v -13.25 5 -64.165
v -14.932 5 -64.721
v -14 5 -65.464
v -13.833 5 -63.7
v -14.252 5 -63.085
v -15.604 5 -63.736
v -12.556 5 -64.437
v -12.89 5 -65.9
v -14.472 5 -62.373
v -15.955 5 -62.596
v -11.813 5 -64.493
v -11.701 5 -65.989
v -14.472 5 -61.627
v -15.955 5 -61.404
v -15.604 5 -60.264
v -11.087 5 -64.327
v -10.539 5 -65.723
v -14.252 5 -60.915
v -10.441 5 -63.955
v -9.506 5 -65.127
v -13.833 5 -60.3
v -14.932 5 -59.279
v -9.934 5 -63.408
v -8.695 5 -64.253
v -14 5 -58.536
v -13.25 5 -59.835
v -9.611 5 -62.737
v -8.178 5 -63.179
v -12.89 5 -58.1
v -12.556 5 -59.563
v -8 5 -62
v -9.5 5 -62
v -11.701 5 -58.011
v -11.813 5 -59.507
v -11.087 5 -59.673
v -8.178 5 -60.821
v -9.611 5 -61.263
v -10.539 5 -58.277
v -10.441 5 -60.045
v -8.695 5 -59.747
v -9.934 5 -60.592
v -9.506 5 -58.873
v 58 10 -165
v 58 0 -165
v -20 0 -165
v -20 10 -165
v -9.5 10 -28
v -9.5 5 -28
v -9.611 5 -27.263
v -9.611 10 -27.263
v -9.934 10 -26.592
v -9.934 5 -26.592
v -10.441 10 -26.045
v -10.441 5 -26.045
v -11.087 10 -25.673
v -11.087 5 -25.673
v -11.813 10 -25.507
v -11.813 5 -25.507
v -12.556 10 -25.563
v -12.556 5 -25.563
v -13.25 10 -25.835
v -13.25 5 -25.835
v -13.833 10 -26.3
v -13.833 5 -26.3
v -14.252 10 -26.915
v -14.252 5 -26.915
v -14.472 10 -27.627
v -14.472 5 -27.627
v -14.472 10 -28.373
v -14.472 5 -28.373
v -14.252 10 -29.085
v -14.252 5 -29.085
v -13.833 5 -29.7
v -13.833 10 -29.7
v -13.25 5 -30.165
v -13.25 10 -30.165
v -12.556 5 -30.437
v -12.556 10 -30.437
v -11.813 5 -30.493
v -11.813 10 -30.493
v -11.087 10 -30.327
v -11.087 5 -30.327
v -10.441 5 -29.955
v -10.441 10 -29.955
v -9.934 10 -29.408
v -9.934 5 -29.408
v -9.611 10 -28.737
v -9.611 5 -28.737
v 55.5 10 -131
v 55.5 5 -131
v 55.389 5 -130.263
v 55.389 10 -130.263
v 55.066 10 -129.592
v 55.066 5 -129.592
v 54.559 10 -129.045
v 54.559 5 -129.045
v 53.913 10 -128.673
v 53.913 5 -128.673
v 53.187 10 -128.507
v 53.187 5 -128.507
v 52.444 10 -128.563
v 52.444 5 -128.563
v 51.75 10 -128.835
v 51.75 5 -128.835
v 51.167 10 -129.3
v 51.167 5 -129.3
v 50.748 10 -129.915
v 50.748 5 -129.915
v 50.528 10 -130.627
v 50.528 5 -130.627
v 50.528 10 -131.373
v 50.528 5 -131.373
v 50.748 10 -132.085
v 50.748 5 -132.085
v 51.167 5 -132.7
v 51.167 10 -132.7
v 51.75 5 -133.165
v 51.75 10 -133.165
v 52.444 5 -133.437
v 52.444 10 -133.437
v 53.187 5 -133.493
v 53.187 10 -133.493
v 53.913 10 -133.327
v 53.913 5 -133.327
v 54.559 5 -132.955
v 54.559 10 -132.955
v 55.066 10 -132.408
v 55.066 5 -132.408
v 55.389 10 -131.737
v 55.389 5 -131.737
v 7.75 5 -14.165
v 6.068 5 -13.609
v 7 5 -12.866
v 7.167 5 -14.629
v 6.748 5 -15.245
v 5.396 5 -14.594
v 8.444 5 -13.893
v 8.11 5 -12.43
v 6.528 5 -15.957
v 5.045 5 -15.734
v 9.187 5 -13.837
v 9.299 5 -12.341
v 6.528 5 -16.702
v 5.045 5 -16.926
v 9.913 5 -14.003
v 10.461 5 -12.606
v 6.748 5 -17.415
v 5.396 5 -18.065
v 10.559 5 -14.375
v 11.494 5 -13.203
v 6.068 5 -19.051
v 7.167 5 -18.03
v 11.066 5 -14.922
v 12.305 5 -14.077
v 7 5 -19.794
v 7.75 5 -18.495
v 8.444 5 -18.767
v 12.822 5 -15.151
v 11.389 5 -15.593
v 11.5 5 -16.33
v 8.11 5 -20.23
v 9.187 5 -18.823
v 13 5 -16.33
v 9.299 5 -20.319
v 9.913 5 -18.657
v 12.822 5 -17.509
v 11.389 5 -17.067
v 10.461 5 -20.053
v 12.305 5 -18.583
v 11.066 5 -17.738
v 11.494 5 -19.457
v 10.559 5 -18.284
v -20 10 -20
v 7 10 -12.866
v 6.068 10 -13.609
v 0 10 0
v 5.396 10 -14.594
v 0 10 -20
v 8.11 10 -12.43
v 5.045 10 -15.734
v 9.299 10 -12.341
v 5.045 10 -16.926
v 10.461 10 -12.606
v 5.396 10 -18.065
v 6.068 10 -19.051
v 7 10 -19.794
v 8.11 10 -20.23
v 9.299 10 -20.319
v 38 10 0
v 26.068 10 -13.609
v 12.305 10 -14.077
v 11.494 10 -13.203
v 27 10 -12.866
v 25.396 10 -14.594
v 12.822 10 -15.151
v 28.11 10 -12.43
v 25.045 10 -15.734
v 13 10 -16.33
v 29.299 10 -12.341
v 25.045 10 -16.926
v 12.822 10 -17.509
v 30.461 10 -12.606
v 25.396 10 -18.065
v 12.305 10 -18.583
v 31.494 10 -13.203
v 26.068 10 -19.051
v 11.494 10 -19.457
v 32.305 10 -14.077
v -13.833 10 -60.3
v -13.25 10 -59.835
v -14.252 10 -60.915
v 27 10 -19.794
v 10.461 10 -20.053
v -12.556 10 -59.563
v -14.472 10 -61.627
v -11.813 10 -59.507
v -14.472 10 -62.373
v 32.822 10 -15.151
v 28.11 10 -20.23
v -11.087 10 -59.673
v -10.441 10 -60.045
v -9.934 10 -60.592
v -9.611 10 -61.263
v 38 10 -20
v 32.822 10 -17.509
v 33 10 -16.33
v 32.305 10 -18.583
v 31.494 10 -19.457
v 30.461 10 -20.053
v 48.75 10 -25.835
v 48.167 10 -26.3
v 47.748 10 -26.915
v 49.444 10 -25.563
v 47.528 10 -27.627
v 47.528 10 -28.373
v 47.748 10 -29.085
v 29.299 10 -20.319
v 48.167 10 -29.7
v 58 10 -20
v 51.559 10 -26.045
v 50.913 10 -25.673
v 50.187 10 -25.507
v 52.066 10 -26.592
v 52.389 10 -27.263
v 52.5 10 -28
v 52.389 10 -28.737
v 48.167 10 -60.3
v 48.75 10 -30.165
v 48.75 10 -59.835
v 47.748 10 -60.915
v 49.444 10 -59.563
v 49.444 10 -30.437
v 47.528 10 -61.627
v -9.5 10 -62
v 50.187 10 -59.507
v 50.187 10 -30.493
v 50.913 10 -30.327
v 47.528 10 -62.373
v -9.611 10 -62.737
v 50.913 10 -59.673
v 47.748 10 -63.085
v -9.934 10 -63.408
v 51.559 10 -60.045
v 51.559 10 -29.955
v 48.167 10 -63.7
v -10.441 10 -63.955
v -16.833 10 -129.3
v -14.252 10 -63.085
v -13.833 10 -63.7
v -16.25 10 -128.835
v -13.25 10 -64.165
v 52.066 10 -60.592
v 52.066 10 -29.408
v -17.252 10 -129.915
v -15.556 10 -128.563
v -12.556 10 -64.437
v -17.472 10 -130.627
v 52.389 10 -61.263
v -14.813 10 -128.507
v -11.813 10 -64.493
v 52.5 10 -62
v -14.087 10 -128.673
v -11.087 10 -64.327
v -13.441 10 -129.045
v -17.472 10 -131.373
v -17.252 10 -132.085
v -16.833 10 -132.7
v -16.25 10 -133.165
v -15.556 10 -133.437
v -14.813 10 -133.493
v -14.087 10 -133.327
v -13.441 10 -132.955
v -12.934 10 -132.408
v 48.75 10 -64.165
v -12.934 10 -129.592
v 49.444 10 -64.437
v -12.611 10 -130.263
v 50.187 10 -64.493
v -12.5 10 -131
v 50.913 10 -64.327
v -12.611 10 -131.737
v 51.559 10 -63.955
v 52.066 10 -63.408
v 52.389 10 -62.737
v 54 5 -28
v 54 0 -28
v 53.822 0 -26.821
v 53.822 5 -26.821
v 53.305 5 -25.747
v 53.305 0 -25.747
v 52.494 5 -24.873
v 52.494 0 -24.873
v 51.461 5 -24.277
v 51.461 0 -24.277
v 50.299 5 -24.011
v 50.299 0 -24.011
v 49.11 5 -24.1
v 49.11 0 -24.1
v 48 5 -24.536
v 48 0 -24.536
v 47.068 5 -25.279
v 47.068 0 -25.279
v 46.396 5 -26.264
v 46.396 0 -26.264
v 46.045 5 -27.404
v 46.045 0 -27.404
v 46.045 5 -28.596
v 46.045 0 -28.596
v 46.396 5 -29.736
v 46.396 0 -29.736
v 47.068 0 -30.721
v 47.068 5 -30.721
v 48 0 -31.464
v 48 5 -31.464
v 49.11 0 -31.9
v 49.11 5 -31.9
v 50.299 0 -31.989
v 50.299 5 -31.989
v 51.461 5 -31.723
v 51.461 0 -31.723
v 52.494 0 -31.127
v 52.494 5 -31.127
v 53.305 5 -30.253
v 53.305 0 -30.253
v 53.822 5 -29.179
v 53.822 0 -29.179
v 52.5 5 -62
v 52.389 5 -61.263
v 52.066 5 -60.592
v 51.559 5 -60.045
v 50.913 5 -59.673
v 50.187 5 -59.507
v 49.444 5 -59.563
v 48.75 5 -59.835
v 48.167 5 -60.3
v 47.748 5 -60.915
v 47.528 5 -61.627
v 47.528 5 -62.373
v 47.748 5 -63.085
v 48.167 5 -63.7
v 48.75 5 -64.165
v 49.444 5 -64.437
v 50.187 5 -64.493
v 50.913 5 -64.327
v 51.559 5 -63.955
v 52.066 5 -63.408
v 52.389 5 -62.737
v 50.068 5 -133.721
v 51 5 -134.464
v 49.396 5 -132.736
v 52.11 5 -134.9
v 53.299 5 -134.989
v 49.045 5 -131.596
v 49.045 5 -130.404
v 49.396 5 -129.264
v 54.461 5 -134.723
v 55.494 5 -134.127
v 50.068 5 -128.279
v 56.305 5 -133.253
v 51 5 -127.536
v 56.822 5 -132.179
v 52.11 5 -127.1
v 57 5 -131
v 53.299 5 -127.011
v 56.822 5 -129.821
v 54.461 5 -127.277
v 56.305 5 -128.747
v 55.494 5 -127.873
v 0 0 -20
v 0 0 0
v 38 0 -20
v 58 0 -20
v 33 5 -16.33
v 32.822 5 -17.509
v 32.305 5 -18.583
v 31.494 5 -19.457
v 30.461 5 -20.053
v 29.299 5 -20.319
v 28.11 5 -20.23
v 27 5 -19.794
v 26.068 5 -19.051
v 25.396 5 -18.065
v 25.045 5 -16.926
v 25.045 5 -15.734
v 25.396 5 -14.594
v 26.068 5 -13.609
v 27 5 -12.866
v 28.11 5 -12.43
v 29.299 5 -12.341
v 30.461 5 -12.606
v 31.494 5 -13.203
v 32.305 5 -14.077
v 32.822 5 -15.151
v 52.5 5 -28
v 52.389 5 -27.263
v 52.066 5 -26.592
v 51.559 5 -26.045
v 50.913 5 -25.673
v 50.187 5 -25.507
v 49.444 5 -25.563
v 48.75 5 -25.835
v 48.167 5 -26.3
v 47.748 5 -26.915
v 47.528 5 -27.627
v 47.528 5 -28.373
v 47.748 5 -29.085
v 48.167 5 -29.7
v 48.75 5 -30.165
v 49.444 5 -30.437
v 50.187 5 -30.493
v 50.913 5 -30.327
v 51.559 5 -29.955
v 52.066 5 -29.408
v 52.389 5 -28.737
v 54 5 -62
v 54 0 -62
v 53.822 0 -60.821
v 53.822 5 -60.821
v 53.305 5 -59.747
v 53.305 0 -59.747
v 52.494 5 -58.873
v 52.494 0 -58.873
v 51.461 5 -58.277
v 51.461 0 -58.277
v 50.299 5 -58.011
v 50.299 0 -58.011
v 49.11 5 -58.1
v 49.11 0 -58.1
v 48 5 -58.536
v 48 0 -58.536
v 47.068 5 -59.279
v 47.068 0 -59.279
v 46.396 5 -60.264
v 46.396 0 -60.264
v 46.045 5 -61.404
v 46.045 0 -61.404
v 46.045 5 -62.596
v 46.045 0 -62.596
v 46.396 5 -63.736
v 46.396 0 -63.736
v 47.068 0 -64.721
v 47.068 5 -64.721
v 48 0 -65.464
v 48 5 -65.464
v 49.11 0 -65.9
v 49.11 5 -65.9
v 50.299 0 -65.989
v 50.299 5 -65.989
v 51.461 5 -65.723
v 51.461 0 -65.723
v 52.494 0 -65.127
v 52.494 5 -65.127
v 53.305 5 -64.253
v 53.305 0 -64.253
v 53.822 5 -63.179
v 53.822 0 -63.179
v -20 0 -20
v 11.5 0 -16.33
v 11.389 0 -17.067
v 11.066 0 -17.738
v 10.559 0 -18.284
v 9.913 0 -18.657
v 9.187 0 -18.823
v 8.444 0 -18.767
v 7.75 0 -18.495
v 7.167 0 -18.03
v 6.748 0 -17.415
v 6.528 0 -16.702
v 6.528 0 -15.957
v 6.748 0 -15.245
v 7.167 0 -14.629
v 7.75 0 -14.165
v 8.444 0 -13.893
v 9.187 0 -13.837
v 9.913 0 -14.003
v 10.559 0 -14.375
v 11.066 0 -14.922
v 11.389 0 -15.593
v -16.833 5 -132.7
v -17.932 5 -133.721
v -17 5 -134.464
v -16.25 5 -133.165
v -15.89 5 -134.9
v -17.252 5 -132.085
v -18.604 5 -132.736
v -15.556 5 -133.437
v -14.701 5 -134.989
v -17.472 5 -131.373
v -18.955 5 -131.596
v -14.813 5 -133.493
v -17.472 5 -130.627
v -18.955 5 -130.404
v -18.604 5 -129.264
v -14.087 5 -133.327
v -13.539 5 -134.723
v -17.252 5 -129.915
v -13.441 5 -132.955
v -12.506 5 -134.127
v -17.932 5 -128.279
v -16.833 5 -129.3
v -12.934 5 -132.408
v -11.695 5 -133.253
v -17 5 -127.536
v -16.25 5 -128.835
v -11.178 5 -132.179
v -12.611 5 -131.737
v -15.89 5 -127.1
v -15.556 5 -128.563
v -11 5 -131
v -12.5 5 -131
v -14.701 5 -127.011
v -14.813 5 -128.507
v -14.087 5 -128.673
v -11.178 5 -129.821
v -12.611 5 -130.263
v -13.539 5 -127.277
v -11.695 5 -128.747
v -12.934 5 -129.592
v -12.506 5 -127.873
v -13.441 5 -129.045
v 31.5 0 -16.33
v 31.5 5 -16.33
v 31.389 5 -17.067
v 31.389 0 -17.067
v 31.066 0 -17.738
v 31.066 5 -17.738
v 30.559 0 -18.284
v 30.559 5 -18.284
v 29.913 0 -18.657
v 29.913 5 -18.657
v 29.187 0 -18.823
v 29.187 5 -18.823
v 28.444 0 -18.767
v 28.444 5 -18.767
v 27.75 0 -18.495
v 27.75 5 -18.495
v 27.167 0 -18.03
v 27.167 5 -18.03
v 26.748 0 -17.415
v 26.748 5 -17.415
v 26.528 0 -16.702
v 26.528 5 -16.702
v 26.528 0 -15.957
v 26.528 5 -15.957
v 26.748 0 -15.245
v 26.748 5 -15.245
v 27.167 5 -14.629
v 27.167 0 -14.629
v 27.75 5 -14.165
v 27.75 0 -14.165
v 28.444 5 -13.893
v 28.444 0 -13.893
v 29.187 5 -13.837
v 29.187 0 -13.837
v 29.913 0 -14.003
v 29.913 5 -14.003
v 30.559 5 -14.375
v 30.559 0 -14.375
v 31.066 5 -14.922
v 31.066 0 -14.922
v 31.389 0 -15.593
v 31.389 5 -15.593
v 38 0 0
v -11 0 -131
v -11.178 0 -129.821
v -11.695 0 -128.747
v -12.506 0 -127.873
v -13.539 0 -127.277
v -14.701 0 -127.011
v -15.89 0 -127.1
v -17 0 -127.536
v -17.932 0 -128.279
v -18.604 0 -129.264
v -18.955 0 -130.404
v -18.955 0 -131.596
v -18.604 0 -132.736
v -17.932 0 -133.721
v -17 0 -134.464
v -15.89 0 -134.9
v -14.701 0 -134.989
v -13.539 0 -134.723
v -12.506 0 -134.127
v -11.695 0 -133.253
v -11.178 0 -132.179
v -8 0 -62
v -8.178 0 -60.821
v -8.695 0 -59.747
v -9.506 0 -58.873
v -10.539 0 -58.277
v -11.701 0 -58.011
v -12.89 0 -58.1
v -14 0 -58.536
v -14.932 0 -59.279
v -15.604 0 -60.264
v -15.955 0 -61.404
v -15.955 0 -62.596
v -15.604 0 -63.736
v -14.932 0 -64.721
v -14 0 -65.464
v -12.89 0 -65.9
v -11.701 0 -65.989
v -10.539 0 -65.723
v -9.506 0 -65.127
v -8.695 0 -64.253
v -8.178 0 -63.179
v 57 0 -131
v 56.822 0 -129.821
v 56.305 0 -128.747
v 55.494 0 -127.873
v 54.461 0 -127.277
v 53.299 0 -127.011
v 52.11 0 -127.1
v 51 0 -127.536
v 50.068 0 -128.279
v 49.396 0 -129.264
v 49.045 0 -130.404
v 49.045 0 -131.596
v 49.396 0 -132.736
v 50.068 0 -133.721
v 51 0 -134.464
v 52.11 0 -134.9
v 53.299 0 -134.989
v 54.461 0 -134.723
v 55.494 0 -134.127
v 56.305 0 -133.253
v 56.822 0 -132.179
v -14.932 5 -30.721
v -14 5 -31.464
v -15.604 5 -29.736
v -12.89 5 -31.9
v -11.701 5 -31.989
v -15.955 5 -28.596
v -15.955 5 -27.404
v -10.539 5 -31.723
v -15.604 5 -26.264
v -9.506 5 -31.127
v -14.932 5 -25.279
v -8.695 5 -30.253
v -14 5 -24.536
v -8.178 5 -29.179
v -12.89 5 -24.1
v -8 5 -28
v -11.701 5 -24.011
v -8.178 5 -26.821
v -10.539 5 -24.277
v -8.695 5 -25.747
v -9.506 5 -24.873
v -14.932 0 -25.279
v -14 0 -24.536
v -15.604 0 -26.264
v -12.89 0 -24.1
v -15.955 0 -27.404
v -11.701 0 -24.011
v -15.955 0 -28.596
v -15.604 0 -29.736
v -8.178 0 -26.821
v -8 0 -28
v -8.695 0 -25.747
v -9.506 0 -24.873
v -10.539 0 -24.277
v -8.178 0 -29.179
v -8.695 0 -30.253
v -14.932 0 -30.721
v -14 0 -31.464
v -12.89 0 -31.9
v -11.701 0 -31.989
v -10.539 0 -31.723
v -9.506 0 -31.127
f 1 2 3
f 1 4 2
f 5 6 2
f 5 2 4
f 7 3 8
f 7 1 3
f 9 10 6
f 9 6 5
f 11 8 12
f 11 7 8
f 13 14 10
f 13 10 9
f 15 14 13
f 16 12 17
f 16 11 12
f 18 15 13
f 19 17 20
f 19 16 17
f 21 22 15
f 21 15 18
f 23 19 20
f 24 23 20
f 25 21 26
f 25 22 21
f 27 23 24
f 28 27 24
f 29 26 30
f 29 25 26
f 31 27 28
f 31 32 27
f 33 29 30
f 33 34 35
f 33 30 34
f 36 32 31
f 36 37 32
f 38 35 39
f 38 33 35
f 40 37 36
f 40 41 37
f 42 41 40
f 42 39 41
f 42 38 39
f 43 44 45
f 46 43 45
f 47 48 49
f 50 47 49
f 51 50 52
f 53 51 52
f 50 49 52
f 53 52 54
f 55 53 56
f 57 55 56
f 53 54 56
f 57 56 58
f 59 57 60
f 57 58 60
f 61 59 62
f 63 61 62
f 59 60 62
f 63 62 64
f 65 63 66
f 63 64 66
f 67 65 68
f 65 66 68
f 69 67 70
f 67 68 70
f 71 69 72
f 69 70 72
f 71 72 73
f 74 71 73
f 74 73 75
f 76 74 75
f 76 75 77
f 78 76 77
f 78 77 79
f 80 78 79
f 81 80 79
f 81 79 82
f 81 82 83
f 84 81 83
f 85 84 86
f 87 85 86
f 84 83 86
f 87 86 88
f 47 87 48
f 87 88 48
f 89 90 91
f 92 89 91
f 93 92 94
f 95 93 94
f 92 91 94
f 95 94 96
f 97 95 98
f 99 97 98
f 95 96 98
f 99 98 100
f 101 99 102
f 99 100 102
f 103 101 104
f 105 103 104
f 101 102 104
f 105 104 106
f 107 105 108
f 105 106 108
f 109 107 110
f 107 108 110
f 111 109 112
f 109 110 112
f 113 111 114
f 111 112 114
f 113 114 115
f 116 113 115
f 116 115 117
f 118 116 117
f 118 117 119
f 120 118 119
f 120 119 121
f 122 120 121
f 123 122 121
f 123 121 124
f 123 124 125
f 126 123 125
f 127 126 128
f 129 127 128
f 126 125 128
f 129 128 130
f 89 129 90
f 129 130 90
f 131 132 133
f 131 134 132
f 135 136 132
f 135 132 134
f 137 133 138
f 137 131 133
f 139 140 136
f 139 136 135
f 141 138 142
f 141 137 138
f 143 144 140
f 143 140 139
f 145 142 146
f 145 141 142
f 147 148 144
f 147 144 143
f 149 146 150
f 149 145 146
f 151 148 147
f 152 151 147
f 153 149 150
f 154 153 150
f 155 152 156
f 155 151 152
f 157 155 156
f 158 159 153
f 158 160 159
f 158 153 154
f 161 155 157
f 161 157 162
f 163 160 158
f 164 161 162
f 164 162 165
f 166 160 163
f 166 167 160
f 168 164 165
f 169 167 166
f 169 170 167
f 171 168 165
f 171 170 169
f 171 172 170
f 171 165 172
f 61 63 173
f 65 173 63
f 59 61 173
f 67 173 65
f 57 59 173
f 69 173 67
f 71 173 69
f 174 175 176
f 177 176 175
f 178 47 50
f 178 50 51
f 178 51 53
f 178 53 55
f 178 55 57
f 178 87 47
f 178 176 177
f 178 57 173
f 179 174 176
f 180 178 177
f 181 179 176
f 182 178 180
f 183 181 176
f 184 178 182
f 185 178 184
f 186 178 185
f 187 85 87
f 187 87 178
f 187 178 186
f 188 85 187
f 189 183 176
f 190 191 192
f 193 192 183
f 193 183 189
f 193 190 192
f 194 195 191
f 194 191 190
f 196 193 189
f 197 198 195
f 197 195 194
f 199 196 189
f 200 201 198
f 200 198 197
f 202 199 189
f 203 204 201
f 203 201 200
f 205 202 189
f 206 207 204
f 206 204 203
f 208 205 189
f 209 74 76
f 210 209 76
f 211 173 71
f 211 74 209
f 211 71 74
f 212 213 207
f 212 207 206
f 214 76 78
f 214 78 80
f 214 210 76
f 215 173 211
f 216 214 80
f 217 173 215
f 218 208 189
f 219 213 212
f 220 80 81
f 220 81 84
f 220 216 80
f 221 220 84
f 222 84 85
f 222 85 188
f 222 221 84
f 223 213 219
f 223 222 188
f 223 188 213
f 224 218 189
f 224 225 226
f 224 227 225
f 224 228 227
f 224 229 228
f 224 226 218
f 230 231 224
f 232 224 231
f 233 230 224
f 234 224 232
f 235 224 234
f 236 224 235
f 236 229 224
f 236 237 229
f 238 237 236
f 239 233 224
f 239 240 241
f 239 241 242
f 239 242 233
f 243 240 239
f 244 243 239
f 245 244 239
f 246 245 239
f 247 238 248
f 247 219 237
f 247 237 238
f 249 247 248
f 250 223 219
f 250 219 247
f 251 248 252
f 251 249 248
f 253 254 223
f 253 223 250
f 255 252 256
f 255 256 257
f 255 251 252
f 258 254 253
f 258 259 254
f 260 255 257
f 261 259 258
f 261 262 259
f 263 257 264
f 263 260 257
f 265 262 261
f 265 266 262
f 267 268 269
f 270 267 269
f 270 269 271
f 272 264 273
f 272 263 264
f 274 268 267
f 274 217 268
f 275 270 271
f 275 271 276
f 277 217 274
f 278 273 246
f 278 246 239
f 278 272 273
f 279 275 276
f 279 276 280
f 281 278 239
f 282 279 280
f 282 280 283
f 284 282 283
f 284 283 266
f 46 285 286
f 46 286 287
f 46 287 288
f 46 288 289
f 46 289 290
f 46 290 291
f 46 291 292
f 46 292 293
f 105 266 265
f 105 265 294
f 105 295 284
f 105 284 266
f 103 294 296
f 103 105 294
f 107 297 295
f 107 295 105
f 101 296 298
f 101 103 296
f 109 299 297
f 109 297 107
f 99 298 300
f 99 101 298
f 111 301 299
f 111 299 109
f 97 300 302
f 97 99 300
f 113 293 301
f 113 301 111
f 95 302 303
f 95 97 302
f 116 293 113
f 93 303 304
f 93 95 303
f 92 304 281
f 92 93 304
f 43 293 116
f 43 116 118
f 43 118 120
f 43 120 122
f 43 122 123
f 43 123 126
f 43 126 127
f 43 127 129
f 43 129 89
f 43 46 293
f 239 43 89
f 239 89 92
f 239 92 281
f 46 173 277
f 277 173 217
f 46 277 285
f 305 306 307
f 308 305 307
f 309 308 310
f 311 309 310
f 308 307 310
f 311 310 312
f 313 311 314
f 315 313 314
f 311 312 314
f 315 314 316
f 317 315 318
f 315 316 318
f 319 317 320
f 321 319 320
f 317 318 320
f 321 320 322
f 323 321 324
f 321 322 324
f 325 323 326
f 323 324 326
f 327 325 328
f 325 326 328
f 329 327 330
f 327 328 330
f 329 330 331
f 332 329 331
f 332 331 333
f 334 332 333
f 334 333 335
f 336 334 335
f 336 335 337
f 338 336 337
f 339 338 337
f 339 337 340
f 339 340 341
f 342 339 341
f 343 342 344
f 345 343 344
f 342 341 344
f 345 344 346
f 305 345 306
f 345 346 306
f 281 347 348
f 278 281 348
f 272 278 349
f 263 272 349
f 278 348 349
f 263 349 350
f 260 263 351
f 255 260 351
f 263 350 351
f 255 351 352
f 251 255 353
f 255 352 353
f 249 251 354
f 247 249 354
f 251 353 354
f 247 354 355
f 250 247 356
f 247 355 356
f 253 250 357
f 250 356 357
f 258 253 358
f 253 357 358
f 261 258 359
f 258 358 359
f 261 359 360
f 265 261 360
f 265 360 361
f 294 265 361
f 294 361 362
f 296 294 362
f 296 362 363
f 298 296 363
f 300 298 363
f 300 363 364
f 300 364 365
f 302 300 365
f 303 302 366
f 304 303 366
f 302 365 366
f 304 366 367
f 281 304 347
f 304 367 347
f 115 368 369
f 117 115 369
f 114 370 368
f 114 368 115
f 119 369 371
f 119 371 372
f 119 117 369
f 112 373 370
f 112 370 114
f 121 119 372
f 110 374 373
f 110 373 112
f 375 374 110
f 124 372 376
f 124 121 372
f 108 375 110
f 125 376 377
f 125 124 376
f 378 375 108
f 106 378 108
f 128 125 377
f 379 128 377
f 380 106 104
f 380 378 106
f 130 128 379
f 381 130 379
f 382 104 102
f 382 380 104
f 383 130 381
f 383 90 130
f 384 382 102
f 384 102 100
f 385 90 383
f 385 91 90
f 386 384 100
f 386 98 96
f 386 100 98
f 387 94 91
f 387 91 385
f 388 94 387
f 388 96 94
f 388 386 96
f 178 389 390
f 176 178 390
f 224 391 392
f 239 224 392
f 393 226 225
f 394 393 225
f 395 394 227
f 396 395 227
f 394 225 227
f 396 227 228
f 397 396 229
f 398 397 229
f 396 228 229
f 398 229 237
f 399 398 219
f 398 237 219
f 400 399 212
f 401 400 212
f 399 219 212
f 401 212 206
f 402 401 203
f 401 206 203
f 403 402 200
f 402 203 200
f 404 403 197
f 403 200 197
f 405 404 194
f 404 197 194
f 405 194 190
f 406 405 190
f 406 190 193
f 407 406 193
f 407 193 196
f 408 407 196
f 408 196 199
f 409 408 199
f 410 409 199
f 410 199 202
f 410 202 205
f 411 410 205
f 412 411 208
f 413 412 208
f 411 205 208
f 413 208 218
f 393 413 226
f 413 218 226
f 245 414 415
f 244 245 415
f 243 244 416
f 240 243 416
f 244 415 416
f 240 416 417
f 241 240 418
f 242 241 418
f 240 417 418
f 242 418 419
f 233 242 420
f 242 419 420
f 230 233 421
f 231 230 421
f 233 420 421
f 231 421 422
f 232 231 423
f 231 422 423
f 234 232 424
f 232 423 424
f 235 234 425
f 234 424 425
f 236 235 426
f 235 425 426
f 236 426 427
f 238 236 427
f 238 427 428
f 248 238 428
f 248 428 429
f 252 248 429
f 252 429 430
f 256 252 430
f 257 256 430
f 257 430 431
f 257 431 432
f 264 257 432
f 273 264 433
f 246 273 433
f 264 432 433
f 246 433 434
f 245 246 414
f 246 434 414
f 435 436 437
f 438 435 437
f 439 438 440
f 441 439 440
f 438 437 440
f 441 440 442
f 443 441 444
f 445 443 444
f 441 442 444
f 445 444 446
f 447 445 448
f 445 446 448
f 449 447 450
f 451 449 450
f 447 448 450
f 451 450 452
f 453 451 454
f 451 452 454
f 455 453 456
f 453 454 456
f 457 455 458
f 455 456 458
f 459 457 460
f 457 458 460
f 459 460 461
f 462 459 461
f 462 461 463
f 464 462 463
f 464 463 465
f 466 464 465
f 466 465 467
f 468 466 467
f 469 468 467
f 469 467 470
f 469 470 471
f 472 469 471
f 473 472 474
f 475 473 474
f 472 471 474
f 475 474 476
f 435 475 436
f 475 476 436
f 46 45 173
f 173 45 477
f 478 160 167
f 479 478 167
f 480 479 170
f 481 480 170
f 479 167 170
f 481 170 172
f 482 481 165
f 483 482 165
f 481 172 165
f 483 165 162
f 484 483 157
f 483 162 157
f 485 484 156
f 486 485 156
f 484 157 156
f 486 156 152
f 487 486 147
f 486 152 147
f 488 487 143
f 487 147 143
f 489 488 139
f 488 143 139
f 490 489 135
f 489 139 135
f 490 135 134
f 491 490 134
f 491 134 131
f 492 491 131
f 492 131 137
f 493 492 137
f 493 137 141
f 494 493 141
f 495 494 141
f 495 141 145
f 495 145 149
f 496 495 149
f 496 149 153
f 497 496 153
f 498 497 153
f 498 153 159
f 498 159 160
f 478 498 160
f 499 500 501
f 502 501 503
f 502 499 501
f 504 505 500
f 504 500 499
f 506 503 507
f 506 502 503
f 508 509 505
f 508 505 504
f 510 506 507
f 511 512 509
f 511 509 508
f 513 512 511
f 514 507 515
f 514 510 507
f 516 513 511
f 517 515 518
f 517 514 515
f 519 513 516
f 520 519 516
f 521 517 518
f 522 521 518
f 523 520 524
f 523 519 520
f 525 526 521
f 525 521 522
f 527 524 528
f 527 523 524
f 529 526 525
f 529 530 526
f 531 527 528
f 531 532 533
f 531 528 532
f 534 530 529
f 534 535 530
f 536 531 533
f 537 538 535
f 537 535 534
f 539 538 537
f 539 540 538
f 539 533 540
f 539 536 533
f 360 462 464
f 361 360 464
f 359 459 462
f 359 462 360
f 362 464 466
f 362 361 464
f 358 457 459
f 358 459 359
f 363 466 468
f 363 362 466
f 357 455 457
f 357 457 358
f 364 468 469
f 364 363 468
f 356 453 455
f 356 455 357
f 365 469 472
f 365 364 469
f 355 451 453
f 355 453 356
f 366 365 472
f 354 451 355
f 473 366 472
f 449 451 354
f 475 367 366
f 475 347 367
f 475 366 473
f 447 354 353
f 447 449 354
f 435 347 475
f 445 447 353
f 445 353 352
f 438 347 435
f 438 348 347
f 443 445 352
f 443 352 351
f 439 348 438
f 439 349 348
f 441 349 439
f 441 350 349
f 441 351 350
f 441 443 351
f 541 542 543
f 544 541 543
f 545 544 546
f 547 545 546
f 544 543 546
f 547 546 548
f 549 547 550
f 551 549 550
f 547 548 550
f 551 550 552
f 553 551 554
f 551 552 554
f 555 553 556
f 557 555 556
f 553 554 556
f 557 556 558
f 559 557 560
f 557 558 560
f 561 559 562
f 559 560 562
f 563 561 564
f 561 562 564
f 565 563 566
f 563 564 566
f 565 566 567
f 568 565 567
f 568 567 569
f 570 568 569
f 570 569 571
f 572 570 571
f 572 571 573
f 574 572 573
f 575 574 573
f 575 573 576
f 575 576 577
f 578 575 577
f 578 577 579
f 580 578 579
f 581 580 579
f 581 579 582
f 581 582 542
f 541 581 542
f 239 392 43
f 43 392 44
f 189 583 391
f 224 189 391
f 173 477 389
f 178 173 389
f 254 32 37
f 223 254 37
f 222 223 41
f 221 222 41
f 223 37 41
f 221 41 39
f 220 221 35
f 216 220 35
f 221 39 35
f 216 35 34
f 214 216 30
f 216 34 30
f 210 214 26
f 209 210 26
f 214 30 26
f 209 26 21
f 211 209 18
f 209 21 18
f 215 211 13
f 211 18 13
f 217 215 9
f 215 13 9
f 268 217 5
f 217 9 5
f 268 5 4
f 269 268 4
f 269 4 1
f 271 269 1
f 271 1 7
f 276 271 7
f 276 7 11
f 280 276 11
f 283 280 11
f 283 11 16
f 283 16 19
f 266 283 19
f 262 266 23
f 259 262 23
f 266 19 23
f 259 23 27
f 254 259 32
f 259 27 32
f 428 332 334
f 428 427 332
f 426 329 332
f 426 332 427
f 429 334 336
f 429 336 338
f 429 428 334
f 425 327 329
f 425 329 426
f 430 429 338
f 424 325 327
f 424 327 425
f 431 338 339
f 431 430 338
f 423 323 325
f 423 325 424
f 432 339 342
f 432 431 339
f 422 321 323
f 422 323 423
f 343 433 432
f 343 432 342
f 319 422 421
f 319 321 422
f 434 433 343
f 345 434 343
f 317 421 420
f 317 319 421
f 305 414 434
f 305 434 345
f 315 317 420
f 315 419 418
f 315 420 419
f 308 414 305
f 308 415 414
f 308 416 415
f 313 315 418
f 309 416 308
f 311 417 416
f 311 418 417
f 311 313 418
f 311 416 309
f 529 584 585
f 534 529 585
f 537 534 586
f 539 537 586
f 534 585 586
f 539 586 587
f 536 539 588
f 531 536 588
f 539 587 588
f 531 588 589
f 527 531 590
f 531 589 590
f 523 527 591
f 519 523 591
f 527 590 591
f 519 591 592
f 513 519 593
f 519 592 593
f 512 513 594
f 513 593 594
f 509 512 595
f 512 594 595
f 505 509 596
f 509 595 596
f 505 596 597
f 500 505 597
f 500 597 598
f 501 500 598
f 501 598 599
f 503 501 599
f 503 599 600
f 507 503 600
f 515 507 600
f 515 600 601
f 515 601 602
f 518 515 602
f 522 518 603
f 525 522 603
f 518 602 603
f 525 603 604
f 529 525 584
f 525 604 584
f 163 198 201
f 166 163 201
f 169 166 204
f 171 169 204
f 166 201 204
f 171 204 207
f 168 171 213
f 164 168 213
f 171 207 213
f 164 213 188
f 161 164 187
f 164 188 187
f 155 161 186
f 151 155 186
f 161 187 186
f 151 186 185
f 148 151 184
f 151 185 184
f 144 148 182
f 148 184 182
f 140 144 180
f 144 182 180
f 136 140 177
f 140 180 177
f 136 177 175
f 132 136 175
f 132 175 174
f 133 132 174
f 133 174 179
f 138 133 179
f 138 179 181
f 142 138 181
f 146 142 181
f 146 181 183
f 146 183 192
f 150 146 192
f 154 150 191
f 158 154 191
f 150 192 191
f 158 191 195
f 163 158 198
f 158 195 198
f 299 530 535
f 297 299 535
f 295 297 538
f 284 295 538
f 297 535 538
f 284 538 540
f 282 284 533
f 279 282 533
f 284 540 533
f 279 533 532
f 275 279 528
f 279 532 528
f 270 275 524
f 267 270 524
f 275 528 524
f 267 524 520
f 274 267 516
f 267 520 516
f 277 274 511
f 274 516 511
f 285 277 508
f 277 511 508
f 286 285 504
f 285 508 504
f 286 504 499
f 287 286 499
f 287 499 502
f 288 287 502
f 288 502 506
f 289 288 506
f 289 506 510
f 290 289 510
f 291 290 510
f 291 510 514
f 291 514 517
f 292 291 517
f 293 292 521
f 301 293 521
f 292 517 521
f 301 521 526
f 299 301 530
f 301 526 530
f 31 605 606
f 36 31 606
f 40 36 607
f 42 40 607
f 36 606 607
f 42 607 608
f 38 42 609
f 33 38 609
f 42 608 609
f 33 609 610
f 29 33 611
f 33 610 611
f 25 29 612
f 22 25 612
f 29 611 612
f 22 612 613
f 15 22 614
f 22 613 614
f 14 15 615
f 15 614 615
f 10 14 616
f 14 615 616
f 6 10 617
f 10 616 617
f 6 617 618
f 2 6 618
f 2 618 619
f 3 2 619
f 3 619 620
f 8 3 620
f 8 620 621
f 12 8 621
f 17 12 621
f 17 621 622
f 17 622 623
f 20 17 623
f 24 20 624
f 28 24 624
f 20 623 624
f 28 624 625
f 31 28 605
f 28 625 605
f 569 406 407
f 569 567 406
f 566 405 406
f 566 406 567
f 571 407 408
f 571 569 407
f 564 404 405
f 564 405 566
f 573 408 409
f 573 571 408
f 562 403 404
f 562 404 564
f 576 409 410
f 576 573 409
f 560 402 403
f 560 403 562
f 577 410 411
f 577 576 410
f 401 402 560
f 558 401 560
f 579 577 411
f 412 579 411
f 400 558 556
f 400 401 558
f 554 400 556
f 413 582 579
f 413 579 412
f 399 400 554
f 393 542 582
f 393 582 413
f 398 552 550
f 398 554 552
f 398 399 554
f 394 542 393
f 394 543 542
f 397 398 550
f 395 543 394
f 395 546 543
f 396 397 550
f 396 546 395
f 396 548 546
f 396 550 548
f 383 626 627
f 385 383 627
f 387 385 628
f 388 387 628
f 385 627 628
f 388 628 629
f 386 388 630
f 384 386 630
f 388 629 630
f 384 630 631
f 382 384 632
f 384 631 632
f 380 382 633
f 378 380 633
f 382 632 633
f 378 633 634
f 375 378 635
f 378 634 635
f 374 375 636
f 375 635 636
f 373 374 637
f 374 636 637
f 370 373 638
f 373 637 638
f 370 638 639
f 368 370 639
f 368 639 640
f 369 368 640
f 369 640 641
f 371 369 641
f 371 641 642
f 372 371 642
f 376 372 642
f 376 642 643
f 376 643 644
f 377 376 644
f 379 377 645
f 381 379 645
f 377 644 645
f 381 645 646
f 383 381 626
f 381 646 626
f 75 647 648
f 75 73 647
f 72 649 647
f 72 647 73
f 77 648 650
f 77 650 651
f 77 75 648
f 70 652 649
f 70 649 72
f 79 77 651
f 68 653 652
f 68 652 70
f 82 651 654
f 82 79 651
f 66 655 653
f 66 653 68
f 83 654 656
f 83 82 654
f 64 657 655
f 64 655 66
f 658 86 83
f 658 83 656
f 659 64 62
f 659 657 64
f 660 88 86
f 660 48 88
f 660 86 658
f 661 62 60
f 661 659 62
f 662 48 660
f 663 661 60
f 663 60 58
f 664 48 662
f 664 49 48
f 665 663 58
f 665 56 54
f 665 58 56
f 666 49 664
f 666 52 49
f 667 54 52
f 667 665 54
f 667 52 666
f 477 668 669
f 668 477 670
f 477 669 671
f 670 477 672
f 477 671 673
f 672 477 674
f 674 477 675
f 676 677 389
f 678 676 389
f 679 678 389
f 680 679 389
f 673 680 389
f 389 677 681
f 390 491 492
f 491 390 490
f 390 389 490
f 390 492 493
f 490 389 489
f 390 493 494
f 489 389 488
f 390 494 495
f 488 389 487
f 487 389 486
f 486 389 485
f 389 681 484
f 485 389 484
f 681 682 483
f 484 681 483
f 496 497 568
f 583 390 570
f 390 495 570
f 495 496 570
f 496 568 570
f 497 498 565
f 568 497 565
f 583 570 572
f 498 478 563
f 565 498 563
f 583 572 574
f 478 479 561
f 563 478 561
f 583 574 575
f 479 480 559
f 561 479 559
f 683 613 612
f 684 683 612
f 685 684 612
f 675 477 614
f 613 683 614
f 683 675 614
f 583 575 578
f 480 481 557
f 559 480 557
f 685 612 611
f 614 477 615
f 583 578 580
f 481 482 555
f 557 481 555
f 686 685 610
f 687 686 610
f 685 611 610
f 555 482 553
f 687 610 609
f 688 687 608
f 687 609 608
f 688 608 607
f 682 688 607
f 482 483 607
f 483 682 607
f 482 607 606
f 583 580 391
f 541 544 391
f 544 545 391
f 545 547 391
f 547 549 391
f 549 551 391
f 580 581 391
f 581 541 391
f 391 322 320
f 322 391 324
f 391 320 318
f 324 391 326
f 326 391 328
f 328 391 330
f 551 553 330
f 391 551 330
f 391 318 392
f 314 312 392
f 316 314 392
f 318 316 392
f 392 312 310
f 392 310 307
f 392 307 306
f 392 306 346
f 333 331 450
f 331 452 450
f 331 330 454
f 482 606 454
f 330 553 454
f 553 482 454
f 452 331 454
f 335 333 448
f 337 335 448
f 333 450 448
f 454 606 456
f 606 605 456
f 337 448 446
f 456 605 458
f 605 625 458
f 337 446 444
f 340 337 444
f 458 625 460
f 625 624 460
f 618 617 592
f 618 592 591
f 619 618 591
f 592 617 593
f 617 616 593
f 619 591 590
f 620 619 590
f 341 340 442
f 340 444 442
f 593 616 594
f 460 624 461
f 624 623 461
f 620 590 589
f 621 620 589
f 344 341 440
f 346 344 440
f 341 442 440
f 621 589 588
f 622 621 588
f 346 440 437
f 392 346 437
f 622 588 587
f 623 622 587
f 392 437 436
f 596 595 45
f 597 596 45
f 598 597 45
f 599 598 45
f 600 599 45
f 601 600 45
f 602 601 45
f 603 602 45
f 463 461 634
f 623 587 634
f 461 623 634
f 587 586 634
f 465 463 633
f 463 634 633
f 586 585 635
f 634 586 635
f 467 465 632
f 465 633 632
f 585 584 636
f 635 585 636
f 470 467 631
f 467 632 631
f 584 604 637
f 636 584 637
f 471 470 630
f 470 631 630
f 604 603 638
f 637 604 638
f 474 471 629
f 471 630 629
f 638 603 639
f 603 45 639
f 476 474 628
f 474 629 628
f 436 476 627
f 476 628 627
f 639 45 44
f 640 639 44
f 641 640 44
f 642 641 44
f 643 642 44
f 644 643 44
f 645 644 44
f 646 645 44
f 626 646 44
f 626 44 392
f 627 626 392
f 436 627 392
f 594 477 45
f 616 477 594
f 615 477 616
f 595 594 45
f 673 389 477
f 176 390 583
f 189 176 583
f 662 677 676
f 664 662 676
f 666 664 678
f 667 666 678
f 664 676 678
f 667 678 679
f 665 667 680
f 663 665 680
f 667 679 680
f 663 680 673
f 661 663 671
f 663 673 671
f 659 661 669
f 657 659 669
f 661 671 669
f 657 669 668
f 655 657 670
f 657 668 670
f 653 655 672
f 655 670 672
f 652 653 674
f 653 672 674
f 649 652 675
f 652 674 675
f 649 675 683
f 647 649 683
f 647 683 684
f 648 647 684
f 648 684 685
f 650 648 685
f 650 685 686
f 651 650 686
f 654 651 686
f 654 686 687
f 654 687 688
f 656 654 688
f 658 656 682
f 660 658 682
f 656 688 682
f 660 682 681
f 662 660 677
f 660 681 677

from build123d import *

# Parameters (mm, degrees)
BOSS_EXTRUDE1_DEPTH = 10
SKETCH2_R           = 4
CUT_EXTRUDE1_DEPTH  = 5
SKETCH3_R           = 2.5
CUT_EXTRUDE2_DEPTH  = 6
SKETCH5_R           = 4
CUT_EXTRUDE3_DEPTH  = 5
SKETCH6_R           = 2.5
CUT_EXTRUDE4_DEPTH  = 5


with BuildPart() as part:
    # Sketch1 → Boss-Extrude1 (new body)
    with BuildSketch(Plane(origin=(0, 0, 0), x_dir=(1, 0, 0), z_dir=(0, 1, 0))):
        Polygon((0, 0), (38, 0), (38, 20), (58, 20), (58, 165), (-20, 165), (-20, 20), (0, 20), align=None)
    extrude(amount=BOSS_EXTRUDE1_DEPTH)

    # Sketch2 → Cut-Extrude1 (cut)
    with BuildSketch(Plane(origin=(0, 10, 0), x_dir=(1, 0, 0), z_dir=(0, 1, 0))):
        with Locations((9, 16.329867595)):
            Circle(SKETCH2_R)
        with Locations((29, 16.329867595)):
            Circle(SKETCH2_R)
    extrude(amount=-CUT_EXTRUDE1_DEPTH, mode=Mode.SUBTRACT)

    # Sketch3 → Cut-Extrude2 (cut, through all)
    with BuildSketch(Plane(origin=(0, 5, 0), x_dir=(1, 0, 0), z_dir=(0, 1, 0))):
        with Locations((9, 16.329867595)):
            Circle(SKETCH3_R)
        with Locations((29, 16.329867595)):
            Circle(SKETCH3_R)
    extrude(amount=-CUT_EXTRUDE2_DEPTH, mode=Mode.SUBTRACT)

    # Sketch5 → Cut-Extrude3 (cut)
    with BuildSketch(Plane.XZ):
        with Locations((-15, -131)):
            Circle(SKETCH5_R)
        with Locations((53, -131)):
            Circle(SKETCH5_R)
        with Locations((-12, -28)):
            Circle(SKETCH5_R)
        with Locations((50, -28)):
            Circle(SKETCH5_R)
        with Locations((-12, -62)):
            Circle(SKETCH5_R)
        with Locations((50, -62)):
            Circle(SKETCH5_R)
    extrude(amount=-CUT_EXTRUDE3_DEPTH, mode=Mode.SUBTRACT)

    # Sketch6 → Cut-Extrude4 (cut)
    with BuildSketch(Plane.XZ.offset(-5)):
        with Locations((-15, -131)):
            Circle(SKETCH6_R)
        with Locations((53, -131)):
            Circle(SKETCH6_R)
        with Locations((-12, -28)):
            Circle(SKETCH6_R)
        with Locations((50, -28)):
            Circle(SKETCH6_R)
        with Locations((-12, -62)):
            Circle(SKETCH6_R)
        with Locations((50, -62)):
            Circle(SKETCH6_R)
    extrude(amount=-CUT_EXTRUDE4_DEPTH, mode=Mode.SUBTRACT)


solid = part.part
